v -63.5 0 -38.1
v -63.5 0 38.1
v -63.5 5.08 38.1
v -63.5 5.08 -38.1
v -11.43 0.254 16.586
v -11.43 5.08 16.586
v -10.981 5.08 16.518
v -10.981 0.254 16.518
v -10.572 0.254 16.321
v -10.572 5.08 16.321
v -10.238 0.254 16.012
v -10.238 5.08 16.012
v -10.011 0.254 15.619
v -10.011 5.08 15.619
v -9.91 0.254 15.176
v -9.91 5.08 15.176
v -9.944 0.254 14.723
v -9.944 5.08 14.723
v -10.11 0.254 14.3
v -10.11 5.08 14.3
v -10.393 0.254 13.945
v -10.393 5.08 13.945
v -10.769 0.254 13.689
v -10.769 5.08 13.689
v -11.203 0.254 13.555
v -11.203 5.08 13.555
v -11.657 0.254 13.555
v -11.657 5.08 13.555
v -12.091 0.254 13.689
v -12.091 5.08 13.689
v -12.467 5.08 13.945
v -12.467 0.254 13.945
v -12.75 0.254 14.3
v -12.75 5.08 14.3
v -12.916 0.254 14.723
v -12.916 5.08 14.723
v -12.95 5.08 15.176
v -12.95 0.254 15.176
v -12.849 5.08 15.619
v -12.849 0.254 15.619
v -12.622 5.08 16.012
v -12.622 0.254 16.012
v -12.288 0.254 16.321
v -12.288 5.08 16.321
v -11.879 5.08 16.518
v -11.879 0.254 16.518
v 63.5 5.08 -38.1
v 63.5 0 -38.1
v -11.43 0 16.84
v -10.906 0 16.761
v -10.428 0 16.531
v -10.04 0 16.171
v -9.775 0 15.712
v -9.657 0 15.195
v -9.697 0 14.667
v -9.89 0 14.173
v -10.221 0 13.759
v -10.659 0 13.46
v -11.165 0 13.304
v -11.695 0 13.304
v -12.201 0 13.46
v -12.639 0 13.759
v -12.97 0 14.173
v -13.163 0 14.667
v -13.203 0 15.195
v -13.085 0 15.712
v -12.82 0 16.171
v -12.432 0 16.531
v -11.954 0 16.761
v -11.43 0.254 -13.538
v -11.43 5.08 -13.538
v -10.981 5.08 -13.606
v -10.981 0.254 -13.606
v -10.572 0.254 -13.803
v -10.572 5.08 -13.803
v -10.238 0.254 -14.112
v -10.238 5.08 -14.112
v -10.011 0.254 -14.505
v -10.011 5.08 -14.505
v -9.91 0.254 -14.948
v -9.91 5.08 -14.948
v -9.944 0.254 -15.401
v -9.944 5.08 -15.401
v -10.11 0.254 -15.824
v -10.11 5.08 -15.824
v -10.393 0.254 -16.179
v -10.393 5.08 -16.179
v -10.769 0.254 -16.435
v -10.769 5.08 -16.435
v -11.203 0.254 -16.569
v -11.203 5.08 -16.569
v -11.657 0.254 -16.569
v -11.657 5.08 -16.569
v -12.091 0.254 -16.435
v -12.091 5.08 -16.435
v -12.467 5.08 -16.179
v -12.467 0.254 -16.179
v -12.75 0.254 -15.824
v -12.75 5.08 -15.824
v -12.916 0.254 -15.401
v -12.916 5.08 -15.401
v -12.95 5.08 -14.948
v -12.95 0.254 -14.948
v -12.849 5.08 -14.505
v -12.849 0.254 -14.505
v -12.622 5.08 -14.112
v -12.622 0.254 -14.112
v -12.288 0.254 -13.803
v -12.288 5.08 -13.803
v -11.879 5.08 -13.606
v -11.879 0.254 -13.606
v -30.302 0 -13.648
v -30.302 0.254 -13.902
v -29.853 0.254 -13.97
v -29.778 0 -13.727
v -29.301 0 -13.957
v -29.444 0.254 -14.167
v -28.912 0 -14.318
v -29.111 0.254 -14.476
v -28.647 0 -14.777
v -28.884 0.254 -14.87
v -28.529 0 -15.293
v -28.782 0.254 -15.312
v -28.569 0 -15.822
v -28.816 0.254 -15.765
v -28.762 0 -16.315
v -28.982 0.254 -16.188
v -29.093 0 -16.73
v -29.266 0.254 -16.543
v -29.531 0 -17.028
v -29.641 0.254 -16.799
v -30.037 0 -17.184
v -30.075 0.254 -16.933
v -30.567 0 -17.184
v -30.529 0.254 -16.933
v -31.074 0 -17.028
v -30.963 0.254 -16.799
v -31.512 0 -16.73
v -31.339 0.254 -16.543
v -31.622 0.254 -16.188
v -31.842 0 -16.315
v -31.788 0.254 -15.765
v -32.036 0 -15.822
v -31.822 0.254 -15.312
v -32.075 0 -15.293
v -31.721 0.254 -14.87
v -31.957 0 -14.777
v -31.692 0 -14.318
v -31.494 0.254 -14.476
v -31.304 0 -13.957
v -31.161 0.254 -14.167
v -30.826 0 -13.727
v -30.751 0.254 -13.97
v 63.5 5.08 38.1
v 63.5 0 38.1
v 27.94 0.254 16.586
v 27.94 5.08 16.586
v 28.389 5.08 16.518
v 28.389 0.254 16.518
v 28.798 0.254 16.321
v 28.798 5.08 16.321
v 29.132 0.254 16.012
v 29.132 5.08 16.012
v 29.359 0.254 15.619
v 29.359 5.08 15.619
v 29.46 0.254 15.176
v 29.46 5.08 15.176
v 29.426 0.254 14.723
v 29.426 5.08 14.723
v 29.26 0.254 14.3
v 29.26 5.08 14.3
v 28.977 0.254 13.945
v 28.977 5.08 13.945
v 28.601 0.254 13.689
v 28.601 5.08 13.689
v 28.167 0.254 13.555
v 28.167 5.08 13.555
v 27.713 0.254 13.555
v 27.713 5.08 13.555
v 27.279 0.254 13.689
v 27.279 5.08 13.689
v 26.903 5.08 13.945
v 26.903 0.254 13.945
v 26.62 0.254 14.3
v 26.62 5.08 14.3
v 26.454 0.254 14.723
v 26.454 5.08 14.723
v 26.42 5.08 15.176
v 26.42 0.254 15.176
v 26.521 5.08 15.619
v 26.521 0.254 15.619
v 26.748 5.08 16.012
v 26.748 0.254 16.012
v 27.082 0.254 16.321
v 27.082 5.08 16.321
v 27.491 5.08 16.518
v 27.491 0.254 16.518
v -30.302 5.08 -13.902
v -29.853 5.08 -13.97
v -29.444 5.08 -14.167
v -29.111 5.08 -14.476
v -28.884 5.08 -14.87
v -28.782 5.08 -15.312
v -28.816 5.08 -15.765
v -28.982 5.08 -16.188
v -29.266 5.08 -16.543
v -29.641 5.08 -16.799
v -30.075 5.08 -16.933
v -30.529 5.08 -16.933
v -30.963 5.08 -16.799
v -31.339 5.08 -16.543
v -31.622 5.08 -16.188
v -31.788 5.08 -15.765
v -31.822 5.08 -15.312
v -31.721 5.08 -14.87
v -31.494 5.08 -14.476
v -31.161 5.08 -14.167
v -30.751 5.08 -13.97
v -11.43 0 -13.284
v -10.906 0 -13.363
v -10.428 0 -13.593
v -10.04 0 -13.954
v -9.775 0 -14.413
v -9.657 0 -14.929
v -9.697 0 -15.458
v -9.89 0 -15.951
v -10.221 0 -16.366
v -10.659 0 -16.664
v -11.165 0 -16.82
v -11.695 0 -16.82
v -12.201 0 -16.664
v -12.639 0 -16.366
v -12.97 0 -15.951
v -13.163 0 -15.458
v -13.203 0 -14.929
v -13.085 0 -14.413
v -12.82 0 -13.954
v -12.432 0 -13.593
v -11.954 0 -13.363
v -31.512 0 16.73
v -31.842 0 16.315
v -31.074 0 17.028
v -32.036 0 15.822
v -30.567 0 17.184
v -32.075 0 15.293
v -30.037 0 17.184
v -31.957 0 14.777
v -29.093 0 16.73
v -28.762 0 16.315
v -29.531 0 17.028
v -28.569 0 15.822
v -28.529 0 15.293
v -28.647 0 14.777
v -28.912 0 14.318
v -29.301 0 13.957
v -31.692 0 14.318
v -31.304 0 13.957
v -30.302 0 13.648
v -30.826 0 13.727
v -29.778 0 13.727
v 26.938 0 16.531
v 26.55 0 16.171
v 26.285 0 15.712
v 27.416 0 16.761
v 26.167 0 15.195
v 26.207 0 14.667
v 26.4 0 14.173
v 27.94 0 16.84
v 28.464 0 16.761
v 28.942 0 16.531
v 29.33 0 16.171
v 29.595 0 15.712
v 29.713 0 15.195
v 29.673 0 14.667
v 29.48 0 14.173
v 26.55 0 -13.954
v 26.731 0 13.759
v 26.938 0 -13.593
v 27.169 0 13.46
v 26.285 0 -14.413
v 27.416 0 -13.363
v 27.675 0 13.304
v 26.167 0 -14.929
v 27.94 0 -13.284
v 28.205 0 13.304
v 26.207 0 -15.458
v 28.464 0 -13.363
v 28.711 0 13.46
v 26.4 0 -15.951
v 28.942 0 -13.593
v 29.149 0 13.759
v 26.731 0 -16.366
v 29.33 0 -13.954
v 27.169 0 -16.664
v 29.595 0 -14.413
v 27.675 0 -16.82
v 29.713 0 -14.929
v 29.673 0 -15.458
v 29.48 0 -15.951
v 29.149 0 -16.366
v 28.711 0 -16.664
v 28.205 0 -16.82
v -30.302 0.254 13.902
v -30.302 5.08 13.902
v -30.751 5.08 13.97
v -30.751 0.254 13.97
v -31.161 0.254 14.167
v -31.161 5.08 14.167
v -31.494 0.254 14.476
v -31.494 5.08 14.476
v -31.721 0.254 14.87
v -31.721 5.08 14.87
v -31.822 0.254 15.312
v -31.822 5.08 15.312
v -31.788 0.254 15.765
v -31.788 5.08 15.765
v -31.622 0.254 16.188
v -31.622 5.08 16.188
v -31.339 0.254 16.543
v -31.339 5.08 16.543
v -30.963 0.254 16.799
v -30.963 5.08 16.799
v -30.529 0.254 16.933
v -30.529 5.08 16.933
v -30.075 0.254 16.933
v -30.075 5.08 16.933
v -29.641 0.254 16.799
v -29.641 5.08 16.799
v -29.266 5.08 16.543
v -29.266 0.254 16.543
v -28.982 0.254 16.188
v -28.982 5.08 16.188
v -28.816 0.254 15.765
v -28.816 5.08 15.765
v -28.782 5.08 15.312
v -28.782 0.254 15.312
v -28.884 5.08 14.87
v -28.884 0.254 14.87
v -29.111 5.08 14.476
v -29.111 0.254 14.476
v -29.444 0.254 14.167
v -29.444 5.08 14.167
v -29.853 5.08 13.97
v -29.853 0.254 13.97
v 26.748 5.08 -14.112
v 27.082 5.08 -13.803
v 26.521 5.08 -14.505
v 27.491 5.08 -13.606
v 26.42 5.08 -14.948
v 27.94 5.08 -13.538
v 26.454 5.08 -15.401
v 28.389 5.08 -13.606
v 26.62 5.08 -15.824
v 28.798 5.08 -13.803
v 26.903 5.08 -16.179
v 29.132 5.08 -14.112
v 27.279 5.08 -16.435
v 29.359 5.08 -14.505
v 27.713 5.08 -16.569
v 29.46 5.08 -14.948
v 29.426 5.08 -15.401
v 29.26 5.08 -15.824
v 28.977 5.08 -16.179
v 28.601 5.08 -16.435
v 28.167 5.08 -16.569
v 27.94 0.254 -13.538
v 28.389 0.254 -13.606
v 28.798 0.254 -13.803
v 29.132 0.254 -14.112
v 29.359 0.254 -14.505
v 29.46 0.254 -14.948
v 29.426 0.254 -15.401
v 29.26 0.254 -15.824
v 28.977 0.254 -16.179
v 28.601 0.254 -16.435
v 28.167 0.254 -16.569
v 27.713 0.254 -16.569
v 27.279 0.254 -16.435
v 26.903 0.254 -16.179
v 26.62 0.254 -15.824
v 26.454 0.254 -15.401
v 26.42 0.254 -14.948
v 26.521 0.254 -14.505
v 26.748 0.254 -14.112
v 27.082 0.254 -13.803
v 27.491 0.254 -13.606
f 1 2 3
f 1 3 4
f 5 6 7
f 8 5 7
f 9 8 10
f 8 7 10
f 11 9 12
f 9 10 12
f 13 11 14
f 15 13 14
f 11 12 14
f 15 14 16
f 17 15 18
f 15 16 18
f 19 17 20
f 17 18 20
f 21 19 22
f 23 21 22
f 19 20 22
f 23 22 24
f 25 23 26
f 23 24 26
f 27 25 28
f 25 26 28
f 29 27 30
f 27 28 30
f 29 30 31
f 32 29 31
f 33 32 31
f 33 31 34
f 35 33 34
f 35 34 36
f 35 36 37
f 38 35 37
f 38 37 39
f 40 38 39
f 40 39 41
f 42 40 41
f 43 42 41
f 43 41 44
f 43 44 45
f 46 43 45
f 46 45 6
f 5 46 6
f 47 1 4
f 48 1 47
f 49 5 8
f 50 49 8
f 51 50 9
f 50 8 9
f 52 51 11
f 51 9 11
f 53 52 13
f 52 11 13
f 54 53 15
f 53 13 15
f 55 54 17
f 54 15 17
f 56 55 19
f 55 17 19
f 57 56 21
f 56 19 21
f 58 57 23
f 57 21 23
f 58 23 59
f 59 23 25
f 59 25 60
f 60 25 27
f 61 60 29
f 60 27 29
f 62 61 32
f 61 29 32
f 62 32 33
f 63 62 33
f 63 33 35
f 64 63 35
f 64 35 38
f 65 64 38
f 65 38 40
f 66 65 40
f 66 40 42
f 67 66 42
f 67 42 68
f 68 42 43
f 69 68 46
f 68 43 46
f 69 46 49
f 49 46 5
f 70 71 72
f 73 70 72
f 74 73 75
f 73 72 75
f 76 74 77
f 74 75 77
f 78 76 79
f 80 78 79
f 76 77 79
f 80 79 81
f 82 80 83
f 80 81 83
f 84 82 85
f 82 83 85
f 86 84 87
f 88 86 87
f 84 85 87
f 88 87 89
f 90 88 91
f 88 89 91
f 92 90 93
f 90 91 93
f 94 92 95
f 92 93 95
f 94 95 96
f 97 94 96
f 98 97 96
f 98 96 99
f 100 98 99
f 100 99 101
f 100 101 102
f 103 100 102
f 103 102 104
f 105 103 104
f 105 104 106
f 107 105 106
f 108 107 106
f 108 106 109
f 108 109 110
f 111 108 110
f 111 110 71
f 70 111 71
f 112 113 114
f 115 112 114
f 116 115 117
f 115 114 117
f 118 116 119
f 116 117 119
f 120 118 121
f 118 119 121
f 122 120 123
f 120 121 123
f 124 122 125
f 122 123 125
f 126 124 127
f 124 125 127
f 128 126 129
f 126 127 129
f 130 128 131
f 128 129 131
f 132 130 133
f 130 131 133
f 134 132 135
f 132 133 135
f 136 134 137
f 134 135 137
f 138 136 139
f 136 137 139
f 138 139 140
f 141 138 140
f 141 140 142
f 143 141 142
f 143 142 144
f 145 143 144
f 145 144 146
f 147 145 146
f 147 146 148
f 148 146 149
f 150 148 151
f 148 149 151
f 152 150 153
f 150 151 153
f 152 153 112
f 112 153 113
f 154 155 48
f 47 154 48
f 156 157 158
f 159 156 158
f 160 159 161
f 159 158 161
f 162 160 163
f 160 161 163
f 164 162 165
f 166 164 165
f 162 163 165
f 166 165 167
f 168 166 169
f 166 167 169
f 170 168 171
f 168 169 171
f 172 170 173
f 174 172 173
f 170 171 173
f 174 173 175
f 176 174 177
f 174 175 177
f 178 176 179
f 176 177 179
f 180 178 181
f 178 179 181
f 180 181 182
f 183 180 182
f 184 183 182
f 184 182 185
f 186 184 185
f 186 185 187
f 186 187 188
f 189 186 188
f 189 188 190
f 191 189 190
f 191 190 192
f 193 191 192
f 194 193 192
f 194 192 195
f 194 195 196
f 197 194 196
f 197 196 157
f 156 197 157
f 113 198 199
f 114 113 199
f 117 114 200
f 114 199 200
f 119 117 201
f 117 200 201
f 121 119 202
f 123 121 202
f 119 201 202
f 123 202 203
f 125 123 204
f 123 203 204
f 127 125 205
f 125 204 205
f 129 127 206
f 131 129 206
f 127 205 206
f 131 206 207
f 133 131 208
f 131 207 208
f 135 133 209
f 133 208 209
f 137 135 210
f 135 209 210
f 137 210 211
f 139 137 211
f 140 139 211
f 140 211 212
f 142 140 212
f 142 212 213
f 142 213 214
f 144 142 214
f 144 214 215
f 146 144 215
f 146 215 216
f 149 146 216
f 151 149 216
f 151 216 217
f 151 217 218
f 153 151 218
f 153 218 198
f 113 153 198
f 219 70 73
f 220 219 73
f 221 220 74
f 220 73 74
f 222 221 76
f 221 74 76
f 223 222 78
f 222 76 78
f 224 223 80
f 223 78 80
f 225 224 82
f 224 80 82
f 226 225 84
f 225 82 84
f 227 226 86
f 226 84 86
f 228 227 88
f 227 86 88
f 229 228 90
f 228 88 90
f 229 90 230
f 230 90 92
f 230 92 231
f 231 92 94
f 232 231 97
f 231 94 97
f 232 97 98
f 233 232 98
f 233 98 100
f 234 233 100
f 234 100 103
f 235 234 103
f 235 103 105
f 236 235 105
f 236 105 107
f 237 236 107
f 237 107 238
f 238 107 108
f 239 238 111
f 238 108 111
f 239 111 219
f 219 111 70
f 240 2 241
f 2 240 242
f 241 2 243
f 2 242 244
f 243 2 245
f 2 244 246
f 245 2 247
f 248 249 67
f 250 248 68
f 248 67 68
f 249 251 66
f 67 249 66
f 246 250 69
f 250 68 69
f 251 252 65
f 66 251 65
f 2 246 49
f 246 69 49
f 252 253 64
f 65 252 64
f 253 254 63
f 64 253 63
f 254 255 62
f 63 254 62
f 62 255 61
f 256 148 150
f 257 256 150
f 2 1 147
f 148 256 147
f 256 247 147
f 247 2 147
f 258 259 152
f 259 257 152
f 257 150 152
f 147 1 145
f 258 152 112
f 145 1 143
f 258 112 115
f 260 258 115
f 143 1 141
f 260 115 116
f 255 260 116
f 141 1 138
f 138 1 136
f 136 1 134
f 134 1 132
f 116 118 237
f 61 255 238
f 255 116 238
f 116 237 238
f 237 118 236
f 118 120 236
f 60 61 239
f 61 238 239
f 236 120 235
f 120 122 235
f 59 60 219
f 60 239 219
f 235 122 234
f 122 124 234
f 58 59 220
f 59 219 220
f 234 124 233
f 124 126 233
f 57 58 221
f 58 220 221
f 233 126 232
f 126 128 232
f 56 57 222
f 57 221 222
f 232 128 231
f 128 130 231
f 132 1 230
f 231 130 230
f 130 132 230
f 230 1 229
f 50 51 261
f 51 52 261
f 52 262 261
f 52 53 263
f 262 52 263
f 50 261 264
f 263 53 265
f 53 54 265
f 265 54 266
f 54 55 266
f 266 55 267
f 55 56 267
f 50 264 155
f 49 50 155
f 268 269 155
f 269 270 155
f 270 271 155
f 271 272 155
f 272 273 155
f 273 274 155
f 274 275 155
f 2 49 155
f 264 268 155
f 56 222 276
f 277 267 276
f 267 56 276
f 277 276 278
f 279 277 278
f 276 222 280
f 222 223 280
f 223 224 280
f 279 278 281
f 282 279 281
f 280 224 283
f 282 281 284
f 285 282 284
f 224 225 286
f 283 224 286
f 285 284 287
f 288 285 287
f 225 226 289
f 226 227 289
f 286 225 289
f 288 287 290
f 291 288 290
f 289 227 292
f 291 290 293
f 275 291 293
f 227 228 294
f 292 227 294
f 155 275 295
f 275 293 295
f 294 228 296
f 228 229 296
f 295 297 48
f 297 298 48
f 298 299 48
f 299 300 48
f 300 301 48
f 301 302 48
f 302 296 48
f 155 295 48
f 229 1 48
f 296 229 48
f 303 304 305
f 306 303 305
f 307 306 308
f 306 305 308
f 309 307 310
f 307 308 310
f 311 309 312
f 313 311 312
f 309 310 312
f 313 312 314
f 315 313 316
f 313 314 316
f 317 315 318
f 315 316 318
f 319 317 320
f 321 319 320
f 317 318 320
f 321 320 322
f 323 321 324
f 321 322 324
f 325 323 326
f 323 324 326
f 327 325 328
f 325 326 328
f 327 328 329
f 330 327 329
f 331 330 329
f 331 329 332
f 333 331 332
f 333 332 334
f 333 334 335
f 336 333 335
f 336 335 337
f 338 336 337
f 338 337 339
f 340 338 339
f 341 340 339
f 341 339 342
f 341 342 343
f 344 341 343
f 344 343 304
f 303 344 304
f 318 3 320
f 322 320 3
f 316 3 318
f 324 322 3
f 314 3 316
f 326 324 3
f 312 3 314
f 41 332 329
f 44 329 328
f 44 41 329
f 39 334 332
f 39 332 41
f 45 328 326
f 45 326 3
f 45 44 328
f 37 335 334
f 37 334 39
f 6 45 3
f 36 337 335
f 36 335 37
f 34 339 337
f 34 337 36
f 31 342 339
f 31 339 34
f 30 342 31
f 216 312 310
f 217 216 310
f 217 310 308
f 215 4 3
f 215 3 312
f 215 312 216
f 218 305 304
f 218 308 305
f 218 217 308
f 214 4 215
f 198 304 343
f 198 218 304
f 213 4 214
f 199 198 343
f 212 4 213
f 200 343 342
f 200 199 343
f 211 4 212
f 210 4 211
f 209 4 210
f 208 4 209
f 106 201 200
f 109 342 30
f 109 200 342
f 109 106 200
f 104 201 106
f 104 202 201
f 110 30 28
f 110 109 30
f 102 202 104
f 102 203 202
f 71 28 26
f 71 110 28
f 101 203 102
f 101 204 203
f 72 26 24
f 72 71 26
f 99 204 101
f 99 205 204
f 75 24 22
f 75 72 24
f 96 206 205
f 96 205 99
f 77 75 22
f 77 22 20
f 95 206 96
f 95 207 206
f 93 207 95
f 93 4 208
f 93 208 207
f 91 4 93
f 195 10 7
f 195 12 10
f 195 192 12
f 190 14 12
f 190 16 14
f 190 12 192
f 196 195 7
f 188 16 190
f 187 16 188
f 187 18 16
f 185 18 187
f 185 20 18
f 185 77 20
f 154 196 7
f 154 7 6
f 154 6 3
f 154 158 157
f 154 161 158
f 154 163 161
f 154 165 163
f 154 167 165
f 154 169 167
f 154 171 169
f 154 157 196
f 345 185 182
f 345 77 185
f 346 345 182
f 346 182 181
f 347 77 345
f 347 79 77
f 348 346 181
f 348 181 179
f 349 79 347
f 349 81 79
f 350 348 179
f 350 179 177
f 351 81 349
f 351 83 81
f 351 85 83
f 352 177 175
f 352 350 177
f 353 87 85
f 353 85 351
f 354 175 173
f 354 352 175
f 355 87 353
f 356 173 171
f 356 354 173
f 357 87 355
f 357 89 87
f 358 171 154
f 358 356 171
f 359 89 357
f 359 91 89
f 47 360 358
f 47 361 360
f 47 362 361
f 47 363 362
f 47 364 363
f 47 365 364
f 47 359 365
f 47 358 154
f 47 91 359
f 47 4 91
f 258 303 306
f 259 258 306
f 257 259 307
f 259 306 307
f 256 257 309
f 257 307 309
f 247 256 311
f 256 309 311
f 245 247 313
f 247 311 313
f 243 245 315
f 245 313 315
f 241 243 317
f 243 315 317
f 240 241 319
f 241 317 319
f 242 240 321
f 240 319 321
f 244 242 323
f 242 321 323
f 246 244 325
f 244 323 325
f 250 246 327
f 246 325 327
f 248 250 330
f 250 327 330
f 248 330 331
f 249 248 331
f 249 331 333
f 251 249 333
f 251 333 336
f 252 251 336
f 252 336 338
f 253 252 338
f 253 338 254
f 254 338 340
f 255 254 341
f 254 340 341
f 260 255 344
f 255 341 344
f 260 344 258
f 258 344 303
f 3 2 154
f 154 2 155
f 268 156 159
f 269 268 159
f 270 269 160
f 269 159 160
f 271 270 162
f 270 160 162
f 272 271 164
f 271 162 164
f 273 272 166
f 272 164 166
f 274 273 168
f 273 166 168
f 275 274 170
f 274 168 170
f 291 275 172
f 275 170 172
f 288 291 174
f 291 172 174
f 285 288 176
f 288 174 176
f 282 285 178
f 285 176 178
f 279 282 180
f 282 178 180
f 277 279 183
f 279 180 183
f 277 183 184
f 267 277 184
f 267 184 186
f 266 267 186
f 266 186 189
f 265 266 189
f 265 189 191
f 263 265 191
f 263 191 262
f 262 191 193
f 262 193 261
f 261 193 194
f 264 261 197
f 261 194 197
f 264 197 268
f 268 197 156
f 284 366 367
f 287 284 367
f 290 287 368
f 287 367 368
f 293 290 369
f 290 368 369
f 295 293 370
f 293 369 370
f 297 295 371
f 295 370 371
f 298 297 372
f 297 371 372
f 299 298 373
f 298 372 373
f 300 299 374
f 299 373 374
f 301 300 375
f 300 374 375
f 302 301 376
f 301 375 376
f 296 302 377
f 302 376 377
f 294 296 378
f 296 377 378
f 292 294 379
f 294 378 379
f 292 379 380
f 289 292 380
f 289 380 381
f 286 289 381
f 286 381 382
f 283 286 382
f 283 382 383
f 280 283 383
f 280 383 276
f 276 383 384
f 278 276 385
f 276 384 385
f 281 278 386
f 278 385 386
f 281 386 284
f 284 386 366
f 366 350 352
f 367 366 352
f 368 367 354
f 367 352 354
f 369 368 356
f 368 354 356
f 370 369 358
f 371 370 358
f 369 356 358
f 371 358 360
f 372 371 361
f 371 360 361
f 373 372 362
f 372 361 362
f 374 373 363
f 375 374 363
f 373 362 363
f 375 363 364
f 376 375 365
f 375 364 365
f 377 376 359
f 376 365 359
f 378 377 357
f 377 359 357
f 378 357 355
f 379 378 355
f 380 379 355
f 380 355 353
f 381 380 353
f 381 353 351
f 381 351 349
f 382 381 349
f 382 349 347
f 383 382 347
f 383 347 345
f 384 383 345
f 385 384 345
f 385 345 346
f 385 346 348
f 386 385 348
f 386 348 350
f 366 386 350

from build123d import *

# Parameters (mm, degrees)
SKETCH1_W           = 127
SKETCH1_H           = 76.2
BOSS_EXTRUDE1_DEPTH = 5.08
SKETCH3_R           = 1.524
CUT_EXTRUDE3_DEPTH  = 75.227127117
CHAMFER1_SIZE       = 0.254


with BuildPart() as part:
    # Sketch1 → Boss-Extrude1 (new body)
    with BuildSketch(Plane(origin=(0, 0, 0), x_dir=(1, 0, 0), z_dir=(0, 1, 0))):
        Rectangle(SKETCH1_W, SKETCH1_H)
    extrude(amount=BOSS_EXTRUDE1_DEPTH)

    # Sketch3 → Cut-Extrude3 (cut, through all)
    with BuildSketch(Plane(origin=(0, 5.08, 0), x_dir=(1, 0, 0), z_dir=(0, 1, 0))):
        with Locations(Location((-30.3022, -15.426316158, 0), (0, 0, 90))):
            Circle(SKETCH3_R)
        with Locations(Location((27.94, -15.0622, 0), (0, 0, 270))):
            Circle(SKETCH3_R)
        with Locations(Location((-11.43, -15.0622, 0), (0, 0, 270))):
            Circle(SKETCH3_R)
        with Locations(Location((27.94, 15.0622, 0), (0, 0, 270))):
            Circle(SKETCH3_R)
        with Locations(Location((-11.43, 15.0622, 0), (0, 0, 270))):
            Circle(SKETCH3_R)
        with Locations(Location((-30.3022, 15.426316158, 0), (0, 0, 270))):
            Circle(SKETCH3_R)
    extrude(amount=-CUT_EXTRUDE3_DEPTH, mode=Mode.SUBTRACT)

    # Chamfer1
    chamfer1_edges = [part.edges().sort_by_distance(p)[0] for p in [
        (-30.3022, 0, 16.950316158),
        (-11.43, 0, 13.5382),
        (-11.43, 0, -16.5862),
        (27.94, 0, 13.5382),
        (-30.3022, 0, -16.950316158),
        (27.94, 0, -16.5862),
    ]]
    chamfer(chamfer1_edges, length=CHAMFER1_SIZE)


solid = part.part
